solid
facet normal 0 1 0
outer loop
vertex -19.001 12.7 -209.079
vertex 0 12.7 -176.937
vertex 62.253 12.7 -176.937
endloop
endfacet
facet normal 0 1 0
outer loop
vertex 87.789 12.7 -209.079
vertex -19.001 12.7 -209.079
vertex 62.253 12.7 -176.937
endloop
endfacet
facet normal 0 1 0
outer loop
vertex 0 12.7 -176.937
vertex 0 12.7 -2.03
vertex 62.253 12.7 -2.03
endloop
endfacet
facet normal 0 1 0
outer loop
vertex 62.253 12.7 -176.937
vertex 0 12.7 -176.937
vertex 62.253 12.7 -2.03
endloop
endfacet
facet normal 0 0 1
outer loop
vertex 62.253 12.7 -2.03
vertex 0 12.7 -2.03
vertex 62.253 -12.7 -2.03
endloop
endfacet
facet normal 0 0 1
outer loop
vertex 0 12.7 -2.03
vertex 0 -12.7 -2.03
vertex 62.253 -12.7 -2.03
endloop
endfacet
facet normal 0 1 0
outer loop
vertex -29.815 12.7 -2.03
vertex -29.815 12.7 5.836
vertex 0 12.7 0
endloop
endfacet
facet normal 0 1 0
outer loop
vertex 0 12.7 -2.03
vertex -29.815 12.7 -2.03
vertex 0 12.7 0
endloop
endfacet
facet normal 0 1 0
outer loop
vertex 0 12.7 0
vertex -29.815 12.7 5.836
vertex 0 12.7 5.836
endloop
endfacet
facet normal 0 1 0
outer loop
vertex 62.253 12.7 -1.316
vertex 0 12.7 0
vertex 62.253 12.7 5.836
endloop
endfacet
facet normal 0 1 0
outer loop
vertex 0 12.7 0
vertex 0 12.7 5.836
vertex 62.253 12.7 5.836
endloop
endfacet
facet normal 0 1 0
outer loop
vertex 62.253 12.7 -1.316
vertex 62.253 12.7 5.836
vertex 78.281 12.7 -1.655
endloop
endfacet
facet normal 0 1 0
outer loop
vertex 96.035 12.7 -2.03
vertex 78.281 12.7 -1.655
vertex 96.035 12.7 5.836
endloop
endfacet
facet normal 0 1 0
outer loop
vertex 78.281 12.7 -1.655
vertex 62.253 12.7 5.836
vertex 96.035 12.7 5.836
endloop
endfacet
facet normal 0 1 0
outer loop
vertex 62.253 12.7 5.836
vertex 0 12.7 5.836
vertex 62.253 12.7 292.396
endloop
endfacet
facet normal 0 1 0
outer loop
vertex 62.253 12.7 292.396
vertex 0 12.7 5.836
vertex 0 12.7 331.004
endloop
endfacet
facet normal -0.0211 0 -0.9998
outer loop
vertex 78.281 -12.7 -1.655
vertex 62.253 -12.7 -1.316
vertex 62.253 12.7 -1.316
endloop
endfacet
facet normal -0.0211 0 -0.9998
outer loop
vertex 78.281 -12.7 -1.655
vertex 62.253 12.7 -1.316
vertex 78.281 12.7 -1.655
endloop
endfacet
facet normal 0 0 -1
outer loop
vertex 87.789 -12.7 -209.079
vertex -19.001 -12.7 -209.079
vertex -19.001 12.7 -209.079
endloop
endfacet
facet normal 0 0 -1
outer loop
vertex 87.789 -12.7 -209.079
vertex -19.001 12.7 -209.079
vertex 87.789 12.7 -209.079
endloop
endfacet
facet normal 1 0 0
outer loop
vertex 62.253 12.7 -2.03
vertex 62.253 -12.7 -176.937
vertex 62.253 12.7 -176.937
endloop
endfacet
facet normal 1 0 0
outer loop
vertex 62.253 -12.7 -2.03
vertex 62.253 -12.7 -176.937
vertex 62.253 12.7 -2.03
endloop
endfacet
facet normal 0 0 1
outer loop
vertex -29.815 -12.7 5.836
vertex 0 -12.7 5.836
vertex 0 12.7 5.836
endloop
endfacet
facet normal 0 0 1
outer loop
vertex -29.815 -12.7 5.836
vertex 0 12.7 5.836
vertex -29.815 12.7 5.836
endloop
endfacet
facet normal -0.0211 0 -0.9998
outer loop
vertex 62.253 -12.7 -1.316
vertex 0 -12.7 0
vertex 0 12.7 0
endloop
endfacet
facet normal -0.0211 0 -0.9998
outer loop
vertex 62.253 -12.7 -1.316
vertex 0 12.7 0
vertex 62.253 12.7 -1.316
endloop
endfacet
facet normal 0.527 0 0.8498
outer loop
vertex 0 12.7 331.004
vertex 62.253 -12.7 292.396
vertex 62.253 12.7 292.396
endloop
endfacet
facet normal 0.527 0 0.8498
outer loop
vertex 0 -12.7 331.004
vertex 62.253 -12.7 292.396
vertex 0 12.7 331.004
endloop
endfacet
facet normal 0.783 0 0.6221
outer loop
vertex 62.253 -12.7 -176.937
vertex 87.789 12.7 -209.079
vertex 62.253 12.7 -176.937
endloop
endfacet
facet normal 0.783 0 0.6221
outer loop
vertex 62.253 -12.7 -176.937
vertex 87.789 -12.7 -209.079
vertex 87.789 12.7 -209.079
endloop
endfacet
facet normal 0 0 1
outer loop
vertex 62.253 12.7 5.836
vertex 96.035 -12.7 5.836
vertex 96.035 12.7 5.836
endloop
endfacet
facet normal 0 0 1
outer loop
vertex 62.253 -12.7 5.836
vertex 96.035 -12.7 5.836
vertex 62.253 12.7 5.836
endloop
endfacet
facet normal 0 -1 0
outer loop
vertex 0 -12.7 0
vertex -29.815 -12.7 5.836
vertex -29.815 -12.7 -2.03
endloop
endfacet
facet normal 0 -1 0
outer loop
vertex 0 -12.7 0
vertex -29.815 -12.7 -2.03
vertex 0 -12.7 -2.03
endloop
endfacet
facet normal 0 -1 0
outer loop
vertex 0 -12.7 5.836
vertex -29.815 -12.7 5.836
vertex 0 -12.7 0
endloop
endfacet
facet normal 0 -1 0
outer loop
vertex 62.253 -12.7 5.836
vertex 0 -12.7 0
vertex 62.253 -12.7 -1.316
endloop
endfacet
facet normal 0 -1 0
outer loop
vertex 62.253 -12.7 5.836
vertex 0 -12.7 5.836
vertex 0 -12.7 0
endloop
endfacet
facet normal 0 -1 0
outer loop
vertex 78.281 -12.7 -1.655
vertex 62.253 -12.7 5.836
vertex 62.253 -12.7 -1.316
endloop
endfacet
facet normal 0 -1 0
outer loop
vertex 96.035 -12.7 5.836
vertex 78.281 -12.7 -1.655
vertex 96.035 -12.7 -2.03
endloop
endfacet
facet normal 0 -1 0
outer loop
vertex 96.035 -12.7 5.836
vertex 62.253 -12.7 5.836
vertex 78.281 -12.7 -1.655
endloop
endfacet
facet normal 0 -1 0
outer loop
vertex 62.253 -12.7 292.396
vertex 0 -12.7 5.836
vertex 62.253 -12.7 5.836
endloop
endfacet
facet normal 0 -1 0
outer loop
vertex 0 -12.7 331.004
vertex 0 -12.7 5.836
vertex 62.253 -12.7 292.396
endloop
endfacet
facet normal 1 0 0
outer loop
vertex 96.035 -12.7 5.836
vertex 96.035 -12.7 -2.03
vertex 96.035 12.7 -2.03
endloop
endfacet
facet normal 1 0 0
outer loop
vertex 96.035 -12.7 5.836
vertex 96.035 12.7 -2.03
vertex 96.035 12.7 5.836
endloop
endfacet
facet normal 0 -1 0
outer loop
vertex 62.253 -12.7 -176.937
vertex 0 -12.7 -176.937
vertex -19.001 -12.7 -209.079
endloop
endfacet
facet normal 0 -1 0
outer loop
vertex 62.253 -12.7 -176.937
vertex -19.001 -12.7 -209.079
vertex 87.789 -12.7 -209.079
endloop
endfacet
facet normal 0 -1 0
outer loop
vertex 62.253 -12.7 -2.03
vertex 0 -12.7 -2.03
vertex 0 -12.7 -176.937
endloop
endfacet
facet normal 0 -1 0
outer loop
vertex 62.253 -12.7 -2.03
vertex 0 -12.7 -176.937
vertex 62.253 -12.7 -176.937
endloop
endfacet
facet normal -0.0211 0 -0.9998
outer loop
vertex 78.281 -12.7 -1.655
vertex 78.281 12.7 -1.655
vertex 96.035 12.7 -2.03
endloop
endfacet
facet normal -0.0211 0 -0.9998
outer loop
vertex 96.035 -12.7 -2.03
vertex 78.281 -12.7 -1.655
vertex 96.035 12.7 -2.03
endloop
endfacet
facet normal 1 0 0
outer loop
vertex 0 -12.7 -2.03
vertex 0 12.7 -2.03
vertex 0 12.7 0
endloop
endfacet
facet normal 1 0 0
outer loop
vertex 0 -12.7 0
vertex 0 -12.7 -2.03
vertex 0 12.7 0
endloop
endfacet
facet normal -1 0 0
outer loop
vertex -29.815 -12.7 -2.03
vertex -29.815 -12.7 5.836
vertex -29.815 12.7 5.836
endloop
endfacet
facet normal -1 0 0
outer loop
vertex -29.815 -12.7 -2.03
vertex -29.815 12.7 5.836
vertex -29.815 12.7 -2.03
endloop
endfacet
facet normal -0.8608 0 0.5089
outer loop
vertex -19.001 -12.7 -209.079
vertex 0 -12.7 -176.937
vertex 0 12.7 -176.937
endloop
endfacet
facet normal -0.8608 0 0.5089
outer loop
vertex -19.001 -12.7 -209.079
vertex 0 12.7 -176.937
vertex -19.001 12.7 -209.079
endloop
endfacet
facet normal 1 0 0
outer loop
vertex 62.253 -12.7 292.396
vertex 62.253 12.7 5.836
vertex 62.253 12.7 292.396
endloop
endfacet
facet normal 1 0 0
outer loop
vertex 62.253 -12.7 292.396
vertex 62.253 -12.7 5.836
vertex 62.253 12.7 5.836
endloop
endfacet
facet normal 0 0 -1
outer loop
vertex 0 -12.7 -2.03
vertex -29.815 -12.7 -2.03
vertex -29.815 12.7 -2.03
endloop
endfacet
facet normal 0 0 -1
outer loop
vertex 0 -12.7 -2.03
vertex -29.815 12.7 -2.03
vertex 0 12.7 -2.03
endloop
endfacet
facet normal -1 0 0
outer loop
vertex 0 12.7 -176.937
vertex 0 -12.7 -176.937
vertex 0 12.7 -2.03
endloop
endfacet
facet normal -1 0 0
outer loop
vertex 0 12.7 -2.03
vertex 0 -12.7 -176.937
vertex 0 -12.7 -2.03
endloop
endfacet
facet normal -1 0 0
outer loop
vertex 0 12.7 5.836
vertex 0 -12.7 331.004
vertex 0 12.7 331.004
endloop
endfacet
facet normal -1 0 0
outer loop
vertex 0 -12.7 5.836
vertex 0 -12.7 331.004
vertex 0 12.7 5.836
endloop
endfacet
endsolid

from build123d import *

# Parameters (mm, degrees)
F0_W     = 62.252599746
F0_H     = 174.907522276
F1_DEPTH = 12.7
F2_DEPTH = 12.7


with BuildPart() as f1:
    # F0 (on Front) → F1 (new body, symmetric)
    with BuildSketch(Plane.XZ):
        with Locations((31.126299873, -89.4837295637)):
            Rectangle(F0_W, F0_H)
    extrude(amount=F1_DEPTH, both=True)

    # F0 (on Front) → F2 (join, symmetric)
    with BuildSketch(Plane.XZ):
        Polygon((62.252599746, -176.9374907017), (0, -176.9374907017), (-19.0012454987, -209.0791165829), (87.7887457609, -209.0791165829), align=None)
    extrude(amount=F2_DEPTH, both=True)


with BuildPart() as f1b:
    # F0 (on Front) → F1, piece 2 (new body, symmetric)
    with BuildSketch(Plane.XZ):
        Polygon((0, 331.0042023659), (0, 5.8361589909), (62.252599746, 5.8361589909), (62.252599746, 292.3958003521), align=None)
        Polygon((78.2806500793, 5.8361589909), (62.252599746, 5.8361589909), (62.252599746, -1.3158836415), (78.2806500793, -1.6546815283), align=None)
        Polygon((96.0349440575, 5.8361589909), (78.2806500793, 5.8361589909), (78.2806500793, -1.6546815283), (96.0349440575, -2.0299684256), align=None)
        Polygon((0, 5.8361589909), (-29.8151597381, 5.8361589909), (-29.8151597381, -2.0299684256), (0, -2.0299684256), (0, 0), (62.252599746, -1.3158836415), (62.252599746, 5.8361589909), align=None)
    extrude(amount=F1_DEPTH, both=True)


solid = Compound([f1.part, f1b.part])
